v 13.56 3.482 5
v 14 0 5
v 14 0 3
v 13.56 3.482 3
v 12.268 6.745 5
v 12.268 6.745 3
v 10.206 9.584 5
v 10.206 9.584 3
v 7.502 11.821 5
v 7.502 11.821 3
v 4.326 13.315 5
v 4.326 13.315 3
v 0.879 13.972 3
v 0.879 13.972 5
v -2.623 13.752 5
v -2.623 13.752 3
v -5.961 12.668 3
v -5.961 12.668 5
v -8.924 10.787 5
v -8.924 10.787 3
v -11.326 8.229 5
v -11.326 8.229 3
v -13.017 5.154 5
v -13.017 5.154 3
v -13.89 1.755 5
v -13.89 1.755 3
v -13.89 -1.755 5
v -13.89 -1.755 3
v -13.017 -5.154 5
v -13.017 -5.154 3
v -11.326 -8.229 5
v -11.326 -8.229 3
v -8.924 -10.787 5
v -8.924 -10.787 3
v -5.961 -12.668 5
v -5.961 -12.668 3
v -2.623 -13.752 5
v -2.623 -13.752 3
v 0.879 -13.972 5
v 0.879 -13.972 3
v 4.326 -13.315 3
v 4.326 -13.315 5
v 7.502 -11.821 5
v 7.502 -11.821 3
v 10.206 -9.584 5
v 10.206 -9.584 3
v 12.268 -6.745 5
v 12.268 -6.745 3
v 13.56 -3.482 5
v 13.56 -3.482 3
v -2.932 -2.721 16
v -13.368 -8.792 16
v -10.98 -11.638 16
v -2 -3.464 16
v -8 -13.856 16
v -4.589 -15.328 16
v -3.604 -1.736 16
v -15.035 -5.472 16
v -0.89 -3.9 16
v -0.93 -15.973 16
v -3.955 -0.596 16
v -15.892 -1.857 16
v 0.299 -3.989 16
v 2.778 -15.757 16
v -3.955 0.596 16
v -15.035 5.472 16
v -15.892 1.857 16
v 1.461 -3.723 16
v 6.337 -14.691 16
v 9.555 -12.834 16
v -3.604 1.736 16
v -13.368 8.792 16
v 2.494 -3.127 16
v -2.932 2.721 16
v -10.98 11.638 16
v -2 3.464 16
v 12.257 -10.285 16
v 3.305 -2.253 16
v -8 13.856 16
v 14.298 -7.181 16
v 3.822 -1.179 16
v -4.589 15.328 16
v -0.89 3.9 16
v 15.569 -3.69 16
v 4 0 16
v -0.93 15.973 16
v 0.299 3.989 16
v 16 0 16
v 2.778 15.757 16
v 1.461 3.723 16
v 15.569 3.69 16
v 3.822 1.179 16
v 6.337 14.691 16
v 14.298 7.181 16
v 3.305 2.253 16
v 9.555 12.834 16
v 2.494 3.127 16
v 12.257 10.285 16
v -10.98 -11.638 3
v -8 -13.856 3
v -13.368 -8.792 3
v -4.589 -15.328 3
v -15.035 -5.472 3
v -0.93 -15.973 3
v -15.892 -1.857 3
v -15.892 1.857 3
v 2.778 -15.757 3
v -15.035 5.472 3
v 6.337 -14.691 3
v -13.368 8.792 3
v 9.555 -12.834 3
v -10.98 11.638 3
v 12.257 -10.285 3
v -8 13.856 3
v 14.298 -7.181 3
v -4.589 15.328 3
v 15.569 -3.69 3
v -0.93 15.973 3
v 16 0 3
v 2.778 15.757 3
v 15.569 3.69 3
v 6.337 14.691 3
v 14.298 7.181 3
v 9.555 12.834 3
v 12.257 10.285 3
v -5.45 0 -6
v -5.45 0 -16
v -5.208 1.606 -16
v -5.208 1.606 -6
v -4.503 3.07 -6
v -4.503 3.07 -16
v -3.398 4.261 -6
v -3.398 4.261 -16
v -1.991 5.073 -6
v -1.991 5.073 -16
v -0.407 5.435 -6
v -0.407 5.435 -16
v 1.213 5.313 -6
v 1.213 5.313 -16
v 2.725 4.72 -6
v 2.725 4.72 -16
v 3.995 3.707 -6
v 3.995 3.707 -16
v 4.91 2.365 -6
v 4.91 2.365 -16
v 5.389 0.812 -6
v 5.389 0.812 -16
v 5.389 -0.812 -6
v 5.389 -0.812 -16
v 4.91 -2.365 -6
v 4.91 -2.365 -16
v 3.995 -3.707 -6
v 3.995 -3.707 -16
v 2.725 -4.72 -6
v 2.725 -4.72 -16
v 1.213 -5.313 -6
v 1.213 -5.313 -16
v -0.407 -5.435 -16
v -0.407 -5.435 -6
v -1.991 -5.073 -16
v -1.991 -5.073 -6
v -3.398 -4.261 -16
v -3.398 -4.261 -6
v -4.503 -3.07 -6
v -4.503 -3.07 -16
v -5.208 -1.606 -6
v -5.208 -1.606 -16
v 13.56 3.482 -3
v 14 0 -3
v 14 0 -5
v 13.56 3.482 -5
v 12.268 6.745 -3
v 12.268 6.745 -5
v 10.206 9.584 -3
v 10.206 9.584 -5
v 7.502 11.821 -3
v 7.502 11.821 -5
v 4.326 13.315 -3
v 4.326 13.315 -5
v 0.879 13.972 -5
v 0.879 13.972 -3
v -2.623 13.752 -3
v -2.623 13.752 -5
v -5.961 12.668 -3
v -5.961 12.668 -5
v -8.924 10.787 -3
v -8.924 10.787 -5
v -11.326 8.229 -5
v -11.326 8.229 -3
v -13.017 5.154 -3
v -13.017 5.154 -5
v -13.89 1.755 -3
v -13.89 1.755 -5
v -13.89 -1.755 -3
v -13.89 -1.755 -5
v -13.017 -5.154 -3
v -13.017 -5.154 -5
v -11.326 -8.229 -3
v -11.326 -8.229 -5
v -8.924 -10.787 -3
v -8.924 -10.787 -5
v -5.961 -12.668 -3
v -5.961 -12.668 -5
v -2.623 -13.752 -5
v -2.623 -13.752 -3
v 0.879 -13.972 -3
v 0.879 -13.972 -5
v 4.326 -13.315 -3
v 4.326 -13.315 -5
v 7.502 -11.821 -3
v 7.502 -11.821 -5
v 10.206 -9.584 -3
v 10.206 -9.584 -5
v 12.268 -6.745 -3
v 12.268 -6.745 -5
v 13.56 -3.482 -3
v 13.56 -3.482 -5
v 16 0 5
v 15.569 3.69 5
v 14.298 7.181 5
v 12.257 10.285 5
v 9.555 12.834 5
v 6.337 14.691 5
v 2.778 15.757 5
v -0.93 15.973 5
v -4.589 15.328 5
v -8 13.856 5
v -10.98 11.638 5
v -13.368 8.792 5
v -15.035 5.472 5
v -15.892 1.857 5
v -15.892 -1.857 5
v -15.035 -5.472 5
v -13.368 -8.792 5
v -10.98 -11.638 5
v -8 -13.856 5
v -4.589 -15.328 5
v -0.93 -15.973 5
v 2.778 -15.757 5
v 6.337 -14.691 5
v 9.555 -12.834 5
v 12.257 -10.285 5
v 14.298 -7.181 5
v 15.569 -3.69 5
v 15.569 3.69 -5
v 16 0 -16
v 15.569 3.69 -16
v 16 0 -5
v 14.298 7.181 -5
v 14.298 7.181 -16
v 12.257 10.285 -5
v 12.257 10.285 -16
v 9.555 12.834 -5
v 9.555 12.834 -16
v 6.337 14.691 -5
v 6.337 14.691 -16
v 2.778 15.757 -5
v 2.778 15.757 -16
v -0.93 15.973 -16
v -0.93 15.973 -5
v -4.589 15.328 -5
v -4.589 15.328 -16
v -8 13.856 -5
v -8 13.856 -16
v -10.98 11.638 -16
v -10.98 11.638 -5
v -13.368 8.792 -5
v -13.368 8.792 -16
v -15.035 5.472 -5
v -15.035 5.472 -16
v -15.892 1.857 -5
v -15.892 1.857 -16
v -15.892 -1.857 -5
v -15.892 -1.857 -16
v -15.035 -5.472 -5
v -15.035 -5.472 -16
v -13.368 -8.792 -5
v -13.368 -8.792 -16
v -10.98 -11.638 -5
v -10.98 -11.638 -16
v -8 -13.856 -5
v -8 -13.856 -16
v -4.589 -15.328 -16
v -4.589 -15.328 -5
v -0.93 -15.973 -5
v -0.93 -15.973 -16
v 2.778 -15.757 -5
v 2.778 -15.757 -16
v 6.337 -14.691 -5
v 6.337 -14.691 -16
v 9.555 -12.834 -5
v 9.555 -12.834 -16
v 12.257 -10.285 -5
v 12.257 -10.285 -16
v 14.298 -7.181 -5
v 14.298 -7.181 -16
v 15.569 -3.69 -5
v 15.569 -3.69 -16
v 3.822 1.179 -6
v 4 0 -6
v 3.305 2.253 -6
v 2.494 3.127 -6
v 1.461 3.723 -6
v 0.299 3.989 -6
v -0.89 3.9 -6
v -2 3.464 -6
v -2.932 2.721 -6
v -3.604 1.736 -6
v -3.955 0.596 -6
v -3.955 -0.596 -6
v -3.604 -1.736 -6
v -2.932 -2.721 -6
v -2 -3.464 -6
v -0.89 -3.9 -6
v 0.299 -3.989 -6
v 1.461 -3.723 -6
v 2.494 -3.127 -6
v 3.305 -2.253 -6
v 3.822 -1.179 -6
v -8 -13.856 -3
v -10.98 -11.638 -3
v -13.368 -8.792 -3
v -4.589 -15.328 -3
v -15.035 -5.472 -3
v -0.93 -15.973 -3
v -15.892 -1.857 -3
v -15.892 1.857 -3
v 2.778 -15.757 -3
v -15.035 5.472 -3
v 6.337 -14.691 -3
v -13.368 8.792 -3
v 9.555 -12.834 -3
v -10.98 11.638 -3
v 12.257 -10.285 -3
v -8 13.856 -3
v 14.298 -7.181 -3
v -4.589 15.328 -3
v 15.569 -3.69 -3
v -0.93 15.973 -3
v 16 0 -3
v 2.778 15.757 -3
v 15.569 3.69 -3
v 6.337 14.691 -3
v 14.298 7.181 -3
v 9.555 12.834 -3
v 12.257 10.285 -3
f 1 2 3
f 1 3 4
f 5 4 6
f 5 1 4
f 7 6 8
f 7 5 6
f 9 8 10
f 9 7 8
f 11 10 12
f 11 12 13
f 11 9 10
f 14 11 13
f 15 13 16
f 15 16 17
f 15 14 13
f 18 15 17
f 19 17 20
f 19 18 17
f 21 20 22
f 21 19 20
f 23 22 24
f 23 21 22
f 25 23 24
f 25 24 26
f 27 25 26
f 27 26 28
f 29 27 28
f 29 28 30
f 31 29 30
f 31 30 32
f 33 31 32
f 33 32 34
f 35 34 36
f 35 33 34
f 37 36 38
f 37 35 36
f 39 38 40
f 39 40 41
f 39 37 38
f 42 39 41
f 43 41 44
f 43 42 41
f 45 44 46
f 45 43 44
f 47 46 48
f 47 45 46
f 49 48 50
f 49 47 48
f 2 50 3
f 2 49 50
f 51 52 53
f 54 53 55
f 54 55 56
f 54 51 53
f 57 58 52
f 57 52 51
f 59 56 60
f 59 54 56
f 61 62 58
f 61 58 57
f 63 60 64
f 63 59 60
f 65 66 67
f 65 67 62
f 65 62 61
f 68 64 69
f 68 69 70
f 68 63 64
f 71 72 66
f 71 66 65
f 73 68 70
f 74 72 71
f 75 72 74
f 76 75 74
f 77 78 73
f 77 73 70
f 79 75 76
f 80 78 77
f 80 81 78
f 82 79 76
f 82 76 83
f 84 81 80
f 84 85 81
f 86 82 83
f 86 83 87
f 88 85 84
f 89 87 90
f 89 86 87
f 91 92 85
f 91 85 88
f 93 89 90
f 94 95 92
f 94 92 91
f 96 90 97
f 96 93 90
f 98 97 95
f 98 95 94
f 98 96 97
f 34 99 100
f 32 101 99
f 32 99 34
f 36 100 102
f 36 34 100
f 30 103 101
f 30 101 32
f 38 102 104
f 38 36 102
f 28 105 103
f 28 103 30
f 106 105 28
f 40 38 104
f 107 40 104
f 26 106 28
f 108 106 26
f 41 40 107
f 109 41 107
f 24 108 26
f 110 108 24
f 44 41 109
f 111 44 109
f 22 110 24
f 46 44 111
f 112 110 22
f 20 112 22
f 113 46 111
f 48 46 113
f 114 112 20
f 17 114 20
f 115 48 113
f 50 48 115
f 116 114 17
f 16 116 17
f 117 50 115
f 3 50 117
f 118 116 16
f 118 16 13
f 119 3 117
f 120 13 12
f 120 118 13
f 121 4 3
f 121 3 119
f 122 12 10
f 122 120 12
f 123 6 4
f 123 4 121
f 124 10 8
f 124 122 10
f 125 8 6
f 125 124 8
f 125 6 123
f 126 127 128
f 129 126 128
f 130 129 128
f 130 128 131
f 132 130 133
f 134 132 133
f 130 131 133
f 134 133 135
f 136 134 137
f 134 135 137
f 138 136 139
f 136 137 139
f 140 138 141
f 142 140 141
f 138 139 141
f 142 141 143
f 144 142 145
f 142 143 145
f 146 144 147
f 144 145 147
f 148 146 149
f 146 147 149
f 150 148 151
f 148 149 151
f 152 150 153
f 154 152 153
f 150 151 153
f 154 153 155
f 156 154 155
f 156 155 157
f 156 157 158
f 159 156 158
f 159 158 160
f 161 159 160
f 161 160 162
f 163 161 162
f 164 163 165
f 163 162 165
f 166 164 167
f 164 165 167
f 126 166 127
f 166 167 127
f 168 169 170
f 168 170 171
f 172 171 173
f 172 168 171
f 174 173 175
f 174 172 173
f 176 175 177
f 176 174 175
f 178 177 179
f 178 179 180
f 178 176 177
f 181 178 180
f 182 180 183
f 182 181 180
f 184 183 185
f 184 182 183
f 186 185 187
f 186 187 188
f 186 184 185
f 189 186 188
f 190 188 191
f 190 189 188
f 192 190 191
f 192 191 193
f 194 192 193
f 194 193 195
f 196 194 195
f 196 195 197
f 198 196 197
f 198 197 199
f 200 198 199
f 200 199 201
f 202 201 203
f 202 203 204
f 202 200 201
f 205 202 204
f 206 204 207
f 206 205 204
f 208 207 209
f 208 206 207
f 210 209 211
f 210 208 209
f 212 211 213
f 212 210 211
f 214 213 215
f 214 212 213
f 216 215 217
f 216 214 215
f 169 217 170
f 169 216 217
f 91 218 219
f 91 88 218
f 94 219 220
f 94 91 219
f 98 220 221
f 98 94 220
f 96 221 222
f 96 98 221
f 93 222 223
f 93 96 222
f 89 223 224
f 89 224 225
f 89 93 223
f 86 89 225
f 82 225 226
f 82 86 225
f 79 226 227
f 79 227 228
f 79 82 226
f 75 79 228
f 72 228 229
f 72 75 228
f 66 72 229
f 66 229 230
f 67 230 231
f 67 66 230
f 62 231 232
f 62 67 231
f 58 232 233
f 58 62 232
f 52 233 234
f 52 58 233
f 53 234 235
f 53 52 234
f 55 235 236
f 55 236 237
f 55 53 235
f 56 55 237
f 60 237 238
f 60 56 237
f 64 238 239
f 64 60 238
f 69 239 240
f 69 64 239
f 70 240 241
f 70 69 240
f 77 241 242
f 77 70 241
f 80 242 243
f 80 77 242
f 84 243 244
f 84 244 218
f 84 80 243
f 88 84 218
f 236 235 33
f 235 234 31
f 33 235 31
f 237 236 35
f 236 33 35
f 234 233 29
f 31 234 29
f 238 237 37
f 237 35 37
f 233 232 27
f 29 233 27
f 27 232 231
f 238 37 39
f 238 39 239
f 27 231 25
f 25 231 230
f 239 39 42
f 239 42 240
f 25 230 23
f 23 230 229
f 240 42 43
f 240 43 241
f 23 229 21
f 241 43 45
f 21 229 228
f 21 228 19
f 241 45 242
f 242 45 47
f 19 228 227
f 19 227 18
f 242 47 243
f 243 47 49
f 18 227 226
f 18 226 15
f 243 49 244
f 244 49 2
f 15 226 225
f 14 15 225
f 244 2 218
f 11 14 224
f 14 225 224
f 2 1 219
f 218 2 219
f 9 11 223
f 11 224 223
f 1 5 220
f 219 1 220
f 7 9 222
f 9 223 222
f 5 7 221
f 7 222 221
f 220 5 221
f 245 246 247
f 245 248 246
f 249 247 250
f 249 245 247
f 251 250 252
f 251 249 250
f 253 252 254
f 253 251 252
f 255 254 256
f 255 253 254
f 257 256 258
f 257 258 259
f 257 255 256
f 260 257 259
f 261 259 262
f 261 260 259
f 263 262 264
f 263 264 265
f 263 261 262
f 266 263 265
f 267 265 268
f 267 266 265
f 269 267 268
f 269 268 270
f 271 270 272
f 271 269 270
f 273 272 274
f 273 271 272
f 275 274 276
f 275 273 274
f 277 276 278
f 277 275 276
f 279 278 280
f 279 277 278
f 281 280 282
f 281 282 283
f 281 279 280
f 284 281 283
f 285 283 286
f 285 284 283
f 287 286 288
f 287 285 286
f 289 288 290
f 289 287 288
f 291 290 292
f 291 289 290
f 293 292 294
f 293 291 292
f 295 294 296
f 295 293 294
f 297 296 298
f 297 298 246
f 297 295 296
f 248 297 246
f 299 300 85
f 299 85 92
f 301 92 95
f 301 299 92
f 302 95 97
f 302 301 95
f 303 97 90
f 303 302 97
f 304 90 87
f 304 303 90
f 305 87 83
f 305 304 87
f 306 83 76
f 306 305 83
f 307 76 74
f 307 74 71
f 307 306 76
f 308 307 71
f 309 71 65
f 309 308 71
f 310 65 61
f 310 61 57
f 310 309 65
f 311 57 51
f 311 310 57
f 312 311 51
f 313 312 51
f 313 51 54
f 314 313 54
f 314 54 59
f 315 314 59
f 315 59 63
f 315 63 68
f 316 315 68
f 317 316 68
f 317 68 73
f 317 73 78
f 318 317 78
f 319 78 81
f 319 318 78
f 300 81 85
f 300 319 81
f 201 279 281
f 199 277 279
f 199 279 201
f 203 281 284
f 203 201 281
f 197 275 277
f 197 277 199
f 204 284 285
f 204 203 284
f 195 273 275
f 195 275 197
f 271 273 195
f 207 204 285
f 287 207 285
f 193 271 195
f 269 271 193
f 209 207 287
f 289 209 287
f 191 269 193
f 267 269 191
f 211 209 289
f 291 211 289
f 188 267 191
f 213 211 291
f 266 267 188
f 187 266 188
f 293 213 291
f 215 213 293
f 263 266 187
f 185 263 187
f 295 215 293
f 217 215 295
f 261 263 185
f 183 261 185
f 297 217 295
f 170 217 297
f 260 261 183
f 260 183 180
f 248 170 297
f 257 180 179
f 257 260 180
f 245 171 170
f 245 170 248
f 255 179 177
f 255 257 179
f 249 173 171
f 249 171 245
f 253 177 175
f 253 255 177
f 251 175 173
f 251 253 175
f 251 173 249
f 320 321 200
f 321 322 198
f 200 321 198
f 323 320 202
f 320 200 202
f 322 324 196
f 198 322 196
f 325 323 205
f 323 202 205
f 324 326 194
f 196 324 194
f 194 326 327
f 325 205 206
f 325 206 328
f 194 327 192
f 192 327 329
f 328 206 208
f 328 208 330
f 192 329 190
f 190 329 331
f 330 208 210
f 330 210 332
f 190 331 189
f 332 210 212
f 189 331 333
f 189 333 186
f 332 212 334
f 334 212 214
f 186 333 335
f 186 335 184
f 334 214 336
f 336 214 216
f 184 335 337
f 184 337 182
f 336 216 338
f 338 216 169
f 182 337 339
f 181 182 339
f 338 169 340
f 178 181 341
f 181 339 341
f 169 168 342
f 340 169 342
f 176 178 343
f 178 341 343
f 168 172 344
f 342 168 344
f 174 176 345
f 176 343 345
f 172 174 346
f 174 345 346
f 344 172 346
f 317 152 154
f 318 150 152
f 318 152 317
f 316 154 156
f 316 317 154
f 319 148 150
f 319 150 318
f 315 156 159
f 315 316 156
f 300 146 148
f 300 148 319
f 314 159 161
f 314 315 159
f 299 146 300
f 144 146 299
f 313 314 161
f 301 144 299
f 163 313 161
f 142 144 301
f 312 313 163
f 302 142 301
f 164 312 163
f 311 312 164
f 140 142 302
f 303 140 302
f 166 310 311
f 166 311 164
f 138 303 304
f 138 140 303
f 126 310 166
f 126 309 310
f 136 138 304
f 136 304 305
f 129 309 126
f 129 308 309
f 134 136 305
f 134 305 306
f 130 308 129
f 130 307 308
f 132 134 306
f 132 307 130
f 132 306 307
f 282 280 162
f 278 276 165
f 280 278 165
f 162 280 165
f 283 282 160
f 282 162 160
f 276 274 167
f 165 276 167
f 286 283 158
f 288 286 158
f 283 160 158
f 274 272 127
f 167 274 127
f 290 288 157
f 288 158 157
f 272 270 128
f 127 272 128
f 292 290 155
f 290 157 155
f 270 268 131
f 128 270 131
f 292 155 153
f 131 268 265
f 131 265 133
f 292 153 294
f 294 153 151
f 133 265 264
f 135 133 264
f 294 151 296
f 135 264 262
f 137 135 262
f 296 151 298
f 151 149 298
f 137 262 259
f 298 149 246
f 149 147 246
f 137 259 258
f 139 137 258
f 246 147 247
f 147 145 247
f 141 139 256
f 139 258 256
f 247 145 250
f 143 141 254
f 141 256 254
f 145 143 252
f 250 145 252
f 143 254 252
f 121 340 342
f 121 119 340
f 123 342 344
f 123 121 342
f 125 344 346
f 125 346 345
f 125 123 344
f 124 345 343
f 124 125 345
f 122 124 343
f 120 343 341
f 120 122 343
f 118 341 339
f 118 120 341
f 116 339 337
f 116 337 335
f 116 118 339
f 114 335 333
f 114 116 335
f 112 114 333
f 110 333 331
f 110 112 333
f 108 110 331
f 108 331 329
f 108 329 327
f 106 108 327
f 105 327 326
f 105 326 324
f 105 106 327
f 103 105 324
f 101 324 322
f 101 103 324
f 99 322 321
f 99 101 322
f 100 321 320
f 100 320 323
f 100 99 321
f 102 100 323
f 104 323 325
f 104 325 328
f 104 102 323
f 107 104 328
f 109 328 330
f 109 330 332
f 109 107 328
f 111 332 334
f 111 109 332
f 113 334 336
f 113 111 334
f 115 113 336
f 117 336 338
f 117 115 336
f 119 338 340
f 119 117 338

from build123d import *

# Parameters (mm, degrees)
SKETCH_1_R          = 16
SKETCH_1_R_2        = 4
EXTRUDE_1_DEPTH     = 16
CUT_EXTRUDE_START   = 5
SKETCH_2_R          = 16
SKETCH_2_R_2        = 14
CUT_EXTRUDE_1_DEPTH = 2
CUT_EXTRUDE_START_2 = -3
SKETCH_2_2_R        = 16
SKETCH_2_2_R_2      = 14
CUT_EXTRUDE_2_DEPTH = 2
SKETCH_4_R          = 5.45
CUT_EXTRUDE_4_DEPTH = 10


with BuildPart() as part:
    # 스케치1 → 보스-돌출1 (new, symmetric)
    with BuildSketch(Plane.XY):
        Circle(SKETCH_1_R)
        Circle(SKETCH_1_R_2, mode=Mode.SUBTRACT)
    extrude(amount=EXTRUDE_1_DEPTH, both=True)

    # 스케치2 → 컷-돌출1 (cut)
    with BuildSketch(Plane.XY.offset(CUT_EXTRUDE_START)):
        Circle(SKETCH_2_R)
        Circle(SKETCH_2_R_2, mode=Mode.SUBTRACT)
    extrude(amount=-CUT_EXTRUDE_1_DEPTH, mode=Mode.SUBTRACT)

    # 스케치2<2> → 컷-돌출2 (cut)
    with BuildSketch(Plane.XY.offset(CUT_EXTRUDE_START_2)):
        Circle(SKETCH_2_2_R)
        Circle(SKETCH_2_2_R_2, mode=Mode.SUBTRACT)
    extrude(amount=-CUT_EXTRUDE_2_DEPTH, mode=Mode.SUBTRACT)

    # 스케치4 → 컷-돌출4 (cut)
    with BuildSketch(Plane(origin=(0, 0, -16), x_dir=(-1, 0, 0), z_dir=(0, 0, -1))):
        Circle(SKETCH_4_R)
    extrude(amount=-CUT_EXTRUDE_4_DEPTH, mode=Mode.SUBTRACT)


solid = part.part
